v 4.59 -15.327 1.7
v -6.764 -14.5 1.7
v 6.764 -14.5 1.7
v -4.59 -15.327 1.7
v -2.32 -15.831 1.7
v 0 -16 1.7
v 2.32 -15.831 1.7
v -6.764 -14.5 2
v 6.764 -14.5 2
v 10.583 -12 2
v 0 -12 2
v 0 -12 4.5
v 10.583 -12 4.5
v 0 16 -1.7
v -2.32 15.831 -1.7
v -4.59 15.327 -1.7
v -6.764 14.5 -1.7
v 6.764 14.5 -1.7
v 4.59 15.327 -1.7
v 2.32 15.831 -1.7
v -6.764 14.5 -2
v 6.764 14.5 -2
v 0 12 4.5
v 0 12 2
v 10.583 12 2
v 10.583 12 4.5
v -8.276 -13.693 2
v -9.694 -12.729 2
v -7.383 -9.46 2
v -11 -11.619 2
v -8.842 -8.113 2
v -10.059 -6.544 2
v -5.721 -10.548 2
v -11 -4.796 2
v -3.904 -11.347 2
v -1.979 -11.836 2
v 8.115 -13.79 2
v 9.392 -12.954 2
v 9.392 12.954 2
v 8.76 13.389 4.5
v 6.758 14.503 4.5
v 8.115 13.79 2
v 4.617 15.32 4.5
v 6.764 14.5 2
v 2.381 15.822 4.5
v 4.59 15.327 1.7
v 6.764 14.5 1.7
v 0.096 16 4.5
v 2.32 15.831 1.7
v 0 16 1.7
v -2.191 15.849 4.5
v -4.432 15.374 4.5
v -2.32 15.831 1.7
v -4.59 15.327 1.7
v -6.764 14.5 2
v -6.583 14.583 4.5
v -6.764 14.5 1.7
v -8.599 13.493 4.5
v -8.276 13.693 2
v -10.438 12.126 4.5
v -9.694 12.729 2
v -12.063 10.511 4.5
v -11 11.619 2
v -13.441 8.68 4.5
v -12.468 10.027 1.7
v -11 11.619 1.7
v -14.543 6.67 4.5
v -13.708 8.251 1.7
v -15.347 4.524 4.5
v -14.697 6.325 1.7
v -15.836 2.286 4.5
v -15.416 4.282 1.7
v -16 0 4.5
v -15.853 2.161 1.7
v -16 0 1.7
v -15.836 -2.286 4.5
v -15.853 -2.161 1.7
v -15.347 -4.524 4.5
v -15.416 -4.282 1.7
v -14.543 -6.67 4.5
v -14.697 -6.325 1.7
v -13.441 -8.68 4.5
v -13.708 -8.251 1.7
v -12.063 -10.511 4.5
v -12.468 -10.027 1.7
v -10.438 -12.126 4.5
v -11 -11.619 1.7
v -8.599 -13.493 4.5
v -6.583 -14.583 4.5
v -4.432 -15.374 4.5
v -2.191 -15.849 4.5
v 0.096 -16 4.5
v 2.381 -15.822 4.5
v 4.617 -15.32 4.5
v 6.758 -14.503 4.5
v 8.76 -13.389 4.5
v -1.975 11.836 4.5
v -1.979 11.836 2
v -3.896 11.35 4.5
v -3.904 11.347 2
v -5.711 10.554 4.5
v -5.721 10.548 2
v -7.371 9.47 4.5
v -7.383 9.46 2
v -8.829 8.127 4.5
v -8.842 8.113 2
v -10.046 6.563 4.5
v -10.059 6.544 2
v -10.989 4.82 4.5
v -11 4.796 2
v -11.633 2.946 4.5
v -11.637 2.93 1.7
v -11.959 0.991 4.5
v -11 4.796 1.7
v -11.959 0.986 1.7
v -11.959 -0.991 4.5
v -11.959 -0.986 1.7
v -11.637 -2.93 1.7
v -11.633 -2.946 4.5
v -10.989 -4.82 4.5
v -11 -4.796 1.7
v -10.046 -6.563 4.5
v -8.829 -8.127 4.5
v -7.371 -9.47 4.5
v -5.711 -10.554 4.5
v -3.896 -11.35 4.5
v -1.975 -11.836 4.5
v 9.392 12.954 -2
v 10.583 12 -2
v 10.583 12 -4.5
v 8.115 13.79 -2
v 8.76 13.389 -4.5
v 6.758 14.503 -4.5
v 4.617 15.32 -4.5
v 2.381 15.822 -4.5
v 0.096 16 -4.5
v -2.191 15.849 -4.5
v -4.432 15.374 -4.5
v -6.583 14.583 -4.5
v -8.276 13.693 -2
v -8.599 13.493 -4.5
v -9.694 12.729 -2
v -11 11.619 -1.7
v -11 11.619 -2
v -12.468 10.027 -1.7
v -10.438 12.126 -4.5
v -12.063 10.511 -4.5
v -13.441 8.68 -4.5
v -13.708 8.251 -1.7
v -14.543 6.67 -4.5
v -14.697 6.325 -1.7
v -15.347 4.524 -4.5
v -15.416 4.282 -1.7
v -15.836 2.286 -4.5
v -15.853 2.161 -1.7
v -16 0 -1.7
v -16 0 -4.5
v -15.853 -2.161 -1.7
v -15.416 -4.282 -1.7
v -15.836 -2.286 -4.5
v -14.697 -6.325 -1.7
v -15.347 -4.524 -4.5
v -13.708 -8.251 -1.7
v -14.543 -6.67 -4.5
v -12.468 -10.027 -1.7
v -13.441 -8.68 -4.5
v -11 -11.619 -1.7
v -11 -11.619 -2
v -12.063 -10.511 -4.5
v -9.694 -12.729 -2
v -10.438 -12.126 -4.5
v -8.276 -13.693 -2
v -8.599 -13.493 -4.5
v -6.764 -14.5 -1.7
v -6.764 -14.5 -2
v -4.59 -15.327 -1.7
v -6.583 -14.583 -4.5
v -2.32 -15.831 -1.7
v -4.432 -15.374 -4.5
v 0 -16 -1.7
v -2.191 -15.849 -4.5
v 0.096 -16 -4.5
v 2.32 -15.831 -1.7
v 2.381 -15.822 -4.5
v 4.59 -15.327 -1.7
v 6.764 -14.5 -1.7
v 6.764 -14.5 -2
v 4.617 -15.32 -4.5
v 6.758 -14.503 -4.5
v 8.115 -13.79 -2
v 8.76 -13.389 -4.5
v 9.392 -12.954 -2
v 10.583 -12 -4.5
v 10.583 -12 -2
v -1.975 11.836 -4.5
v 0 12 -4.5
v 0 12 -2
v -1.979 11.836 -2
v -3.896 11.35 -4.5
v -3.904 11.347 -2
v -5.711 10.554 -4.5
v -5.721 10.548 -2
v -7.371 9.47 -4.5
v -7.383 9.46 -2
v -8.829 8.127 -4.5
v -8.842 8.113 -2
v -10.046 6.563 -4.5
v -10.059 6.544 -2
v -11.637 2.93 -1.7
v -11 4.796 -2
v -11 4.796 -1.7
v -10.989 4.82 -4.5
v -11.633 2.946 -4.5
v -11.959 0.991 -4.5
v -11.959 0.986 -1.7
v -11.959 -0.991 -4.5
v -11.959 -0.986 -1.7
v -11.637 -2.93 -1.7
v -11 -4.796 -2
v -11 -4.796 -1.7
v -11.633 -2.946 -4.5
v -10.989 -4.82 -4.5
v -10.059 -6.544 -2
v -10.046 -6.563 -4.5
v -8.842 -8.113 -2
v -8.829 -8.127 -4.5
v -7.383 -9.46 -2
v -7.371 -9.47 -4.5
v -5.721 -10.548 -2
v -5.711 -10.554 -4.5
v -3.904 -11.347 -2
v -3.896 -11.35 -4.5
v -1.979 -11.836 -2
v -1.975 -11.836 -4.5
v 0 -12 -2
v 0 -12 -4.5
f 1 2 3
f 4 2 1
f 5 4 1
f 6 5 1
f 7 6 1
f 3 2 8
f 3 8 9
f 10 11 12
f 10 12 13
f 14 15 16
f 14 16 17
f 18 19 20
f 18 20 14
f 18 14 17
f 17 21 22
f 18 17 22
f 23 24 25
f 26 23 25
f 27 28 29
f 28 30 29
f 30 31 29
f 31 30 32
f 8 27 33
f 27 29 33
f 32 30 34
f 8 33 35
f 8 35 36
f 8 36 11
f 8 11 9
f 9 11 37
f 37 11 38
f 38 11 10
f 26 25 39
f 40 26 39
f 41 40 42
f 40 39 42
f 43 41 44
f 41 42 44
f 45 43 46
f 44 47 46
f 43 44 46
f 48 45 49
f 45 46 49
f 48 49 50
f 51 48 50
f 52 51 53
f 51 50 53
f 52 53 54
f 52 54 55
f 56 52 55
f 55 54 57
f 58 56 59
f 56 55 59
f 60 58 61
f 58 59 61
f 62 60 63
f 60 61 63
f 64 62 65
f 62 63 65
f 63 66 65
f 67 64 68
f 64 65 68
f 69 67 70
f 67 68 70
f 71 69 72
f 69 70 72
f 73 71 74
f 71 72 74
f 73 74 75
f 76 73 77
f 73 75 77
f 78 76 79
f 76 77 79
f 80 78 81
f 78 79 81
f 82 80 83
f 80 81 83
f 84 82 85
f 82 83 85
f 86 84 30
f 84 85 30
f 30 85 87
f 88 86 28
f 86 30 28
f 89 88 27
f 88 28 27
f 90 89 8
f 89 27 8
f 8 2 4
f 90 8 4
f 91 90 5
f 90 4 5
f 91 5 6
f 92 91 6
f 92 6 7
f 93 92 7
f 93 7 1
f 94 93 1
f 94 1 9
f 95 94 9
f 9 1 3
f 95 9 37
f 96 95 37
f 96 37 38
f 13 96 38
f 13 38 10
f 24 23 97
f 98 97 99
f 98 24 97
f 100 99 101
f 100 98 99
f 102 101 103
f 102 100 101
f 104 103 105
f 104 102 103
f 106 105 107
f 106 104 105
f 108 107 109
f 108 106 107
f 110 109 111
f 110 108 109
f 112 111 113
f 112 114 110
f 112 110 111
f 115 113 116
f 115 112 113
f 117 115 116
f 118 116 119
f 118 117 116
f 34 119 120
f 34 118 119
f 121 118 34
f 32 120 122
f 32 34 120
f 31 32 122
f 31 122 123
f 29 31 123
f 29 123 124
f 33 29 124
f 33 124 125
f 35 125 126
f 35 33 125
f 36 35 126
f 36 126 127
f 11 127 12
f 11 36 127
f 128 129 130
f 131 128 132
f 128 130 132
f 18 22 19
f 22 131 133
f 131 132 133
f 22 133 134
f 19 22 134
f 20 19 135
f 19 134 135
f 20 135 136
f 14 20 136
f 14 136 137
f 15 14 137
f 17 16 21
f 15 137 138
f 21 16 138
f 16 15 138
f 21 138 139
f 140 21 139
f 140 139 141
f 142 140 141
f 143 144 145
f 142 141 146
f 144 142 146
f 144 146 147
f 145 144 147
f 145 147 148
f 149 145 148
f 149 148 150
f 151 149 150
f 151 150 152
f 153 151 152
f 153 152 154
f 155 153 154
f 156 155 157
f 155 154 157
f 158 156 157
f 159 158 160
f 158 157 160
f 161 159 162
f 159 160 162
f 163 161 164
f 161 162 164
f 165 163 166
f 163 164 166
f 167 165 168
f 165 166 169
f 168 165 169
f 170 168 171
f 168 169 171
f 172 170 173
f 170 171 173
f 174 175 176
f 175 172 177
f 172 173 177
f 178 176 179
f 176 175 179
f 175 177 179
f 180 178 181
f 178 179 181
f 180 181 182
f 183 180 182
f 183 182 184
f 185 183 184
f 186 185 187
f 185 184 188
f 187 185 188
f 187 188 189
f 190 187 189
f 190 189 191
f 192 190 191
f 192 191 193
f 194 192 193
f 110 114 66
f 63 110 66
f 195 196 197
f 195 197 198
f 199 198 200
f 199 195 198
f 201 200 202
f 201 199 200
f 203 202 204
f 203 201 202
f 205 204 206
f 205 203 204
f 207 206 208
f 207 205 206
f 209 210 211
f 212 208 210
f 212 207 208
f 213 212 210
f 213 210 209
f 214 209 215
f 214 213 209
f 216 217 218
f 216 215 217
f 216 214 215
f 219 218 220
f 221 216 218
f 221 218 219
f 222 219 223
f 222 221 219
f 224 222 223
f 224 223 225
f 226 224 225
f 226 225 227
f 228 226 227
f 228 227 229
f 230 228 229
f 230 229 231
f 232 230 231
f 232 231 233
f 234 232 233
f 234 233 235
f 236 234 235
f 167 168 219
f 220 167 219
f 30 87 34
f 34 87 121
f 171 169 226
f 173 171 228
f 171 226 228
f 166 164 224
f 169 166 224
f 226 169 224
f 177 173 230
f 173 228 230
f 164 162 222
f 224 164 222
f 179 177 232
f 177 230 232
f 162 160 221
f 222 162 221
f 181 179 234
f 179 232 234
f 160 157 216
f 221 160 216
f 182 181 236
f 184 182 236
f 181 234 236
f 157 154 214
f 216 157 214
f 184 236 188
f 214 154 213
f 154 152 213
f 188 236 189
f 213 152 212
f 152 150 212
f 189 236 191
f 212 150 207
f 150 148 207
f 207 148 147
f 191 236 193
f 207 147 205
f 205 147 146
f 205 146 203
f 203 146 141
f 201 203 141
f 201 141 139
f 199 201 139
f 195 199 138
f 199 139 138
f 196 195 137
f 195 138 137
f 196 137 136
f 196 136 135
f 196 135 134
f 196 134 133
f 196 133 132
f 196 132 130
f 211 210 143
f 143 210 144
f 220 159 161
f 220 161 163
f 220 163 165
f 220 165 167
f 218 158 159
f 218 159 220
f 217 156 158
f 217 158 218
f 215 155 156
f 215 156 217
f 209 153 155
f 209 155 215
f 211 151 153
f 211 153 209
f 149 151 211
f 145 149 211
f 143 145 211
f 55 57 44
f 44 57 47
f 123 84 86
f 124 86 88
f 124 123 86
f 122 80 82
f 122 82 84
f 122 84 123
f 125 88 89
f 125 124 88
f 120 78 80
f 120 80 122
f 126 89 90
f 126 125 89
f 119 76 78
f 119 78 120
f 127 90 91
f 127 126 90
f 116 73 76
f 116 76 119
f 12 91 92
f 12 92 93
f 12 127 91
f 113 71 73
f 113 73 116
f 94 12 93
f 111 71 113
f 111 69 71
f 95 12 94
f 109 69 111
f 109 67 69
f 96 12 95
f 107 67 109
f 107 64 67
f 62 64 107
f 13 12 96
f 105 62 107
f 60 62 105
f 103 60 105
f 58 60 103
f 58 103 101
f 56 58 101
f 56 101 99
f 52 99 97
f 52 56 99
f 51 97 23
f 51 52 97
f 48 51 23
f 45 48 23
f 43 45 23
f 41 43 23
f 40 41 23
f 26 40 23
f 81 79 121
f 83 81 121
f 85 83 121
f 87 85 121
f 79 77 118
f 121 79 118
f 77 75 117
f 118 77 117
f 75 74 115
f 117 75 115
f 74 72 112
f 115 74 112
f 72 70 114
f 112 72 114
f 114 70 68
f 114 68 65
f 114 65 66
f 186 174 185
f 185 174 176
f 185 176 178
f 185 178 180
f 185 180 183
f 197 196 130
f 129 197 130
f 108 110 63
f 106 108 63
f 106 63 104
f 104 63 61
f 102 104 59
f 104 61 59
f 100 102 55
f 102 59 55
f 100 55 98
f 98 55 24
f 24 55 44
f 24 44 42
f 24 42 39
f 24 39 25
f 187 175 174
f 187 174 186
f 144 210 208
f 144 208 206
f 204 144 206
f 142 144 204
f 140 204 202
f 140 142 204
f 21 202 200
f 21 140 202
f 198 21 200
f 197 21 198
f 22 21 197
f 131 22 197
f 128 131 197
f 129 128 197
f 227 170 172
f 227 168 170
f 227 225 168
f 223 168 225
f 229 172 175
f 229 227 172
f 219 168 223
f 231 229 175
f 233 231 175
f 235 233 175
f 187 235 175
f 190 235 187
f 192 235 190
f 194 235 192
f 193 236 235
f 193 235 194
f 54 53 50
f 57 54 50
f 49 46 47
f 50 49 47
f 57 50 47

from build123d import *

# Parameters (mm, degrees)
BOX002_W          = 50
BOX002_H          = 29
BOX002_DEPTH      = 4
BOX003_W          = 58
BOX003_H          = 24
BOX003_DEPTH      = 30
CYLINDER002_R     = 12
CYLINDER002_DEPTH = 9
CYLINDER_R        = 16
CYLINDER_DEPTH    = 3.4
CYLINDER001_R     = 16
CYLINDER001_DEPTH = 9


with BuildPart() as inner_lens_extraction_cube:
    # Box002 → Box002 (new body)
    with BuildSketch(Plane(origin=(-11, -14.5, -2), x_dir=(1, 0, 0), z_dir=(0, 0, 1))):
        with Locations((25, 14.5)):
            Rectangle(BOX002_W, BOX002_H)
    extrude(amount=BOX002_DEPTH)


with BuildPart() as inner_cut_cube001:
    # Box003 → Box003 (new body)
    with BuildSketch(Plane(origin=(0, -12, -14), x_dir=(1, 0, 0), z_dir=(0, 0, 1))):
        with Locations((29, 12)):
            Rectangle(BOX003_W, BOX003_H)
    extrude(amount=BOX003_DEPTH)


with BuildPart() as lens_hole002:
    # Cylinder002 → Cylinder002 (new body)
    with BuildSketch(Plane.XY.offset(-4.5)):
        Circle(CYLINDER002_R)
    extrude(amount=CYLINDER002_DEPTH)


with BuildPart() as another_cut_fusion:
    # Cylinder → Cylinder (new body)
    with BuildSketch(Plane.XY.offset(-1.7)):
        Circle(CYLINDER_R)
    extrude(amount=CYLINDER_DEPTH)

    # Fusion001: union inner lens extraction cube, inner cut cube001, lens hole002
    add(inner_lens_extraction_cube.part)
    add(inner_cut_cube001.part)
    add(lens_hole002.part)


with BuildPart() as cut001:
    # Cylinder001 → Cylinder001 (new body)
    with BuildSketch(Plane.XY.offset(-4.5)):
        Circle(CYLINDER001_R)
    extrude(amount=CYLINDER001_DEPTH)

    # Cut001: cut another cut fusion
    add(another_cut_fusion.part, mode=Mode.SUBTRACT)


solid = cut001.part
